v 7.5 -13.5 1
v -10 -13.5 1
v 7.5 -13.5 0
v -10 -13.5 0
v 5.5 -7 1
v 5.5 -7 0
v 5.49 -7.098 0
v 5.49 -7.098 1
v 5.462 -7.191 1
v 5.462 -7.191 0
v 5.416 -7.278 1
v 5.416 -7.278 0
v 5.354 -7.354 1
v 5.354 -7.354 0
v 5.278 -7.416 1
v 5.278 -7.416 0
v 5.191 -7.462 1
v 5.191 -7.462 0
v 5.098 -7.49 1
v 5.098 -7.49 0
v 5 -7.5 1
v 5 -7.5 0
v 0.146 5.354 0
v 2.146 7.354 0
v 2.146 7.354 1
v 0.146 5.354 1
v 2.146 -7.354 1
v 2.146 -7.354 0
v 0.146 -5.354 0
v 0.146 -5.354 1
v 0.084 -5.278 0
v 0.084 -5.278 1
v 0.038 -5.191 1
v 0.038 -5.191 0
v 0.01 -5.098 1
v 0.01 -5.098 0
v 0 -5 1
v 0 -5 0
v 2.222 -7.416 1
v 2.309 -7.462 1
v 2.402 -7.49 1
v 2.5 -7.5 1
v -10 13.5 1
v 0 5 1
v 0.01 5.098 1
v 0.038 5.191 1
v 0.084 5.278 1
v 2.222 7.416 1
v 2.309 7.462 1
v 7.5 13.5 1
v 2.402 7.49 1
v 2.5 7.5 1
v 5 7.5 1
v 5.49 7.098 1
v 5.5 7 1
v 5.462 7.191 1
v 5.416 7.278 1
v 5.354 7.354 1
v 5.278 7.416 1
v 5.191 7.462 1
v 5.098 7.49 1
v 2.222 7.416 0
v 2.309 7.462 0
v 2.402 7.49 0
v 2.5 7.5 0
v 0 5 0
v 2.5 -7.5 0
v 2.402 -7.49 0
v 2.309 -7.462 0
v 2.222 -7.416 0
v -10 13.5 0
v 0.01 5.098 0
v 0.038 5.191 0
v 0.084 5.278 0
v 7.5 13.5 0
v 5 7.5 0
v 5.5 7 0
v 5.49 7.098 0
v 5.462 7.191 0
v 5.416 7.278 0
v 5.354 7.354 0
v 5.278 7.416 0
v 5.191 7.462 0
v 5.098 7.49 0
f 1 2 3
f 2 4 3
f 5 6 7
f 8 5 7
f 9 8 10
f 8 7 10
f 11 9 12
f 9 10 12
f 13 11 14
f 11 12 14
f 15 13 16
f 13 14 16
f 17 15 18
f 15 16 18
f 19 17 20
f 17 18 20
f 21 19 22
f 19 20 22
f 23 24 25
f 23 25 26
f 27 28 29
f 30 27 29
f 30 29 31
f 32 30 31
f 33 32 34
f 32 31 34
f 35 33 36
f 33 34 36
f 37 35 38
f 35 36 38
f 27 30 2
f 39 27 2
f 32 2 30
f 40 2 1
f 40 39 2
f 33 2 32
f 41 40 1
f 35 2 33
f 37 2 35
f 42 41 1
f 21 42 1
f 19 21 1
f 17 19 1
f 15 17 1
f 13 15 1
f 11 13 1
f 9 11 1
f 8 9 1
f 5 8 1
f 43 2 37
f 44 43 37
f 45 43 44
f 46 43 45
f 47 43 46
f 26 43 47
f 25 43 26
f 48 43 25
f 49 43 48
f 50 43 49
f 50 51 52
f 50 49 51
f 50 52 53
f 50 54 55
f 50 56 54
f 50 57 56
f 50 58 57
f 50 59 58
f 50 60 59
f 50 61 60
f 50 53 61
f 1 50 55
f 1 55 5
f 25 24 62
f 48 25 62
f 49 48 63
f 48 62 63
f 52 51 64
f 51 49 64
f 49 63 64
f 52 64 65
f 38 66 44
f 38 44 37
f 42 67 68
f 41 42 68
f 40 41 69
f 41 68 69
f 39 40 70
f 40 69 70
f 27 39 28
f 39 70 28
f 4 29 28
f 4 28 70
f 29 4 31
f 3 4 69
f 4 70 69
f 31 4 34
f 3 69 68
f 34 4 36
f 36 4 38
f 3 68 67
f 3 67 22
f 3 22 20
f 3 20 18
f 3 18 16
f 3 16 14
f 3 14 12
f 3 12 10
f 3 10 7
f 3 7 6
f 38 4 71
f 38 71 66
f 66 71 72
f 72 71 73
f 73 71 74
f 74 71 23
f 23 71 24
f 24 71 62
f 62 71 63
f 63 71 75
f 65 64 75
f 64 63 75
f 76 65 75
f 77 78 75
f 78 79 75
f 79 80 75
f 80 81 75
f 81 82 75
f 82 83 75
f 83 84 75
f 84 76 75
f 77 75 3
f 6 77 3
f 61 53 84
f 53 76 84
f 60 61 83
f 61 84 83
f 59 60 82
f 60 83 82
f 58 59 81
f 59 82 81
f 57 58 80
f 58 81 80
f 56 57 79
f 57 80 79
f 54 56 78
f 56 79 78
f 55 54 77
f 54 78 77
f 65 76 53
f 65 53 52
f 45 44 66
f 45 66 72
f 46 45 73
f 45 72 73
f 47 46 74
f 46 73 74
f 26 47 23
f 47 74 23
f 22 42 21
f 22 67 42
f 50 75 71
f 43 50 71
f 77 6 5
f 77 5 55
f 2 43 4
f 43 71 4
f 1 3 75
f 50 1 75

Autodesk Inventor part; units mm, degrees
ref_plane "YZ Plane" through (0, 0, 0) normal (1, 0, 0) x (0, 1, 0)
ref_plane "XZ Plane" through (0, 0, 0) normal (0, 1, 0) x (-1, 0, 0)
ref_plane "XY Plane" through (0, 0, 0) normal (0, 0, 1) x (1, 0, 0)
sketch "Sketch1" plane through (0, 0, 0) normal (0, 0, 1) x (1, 0, 0)
  line L0 (5, 7.5) -> (2.5, 7.5)
  line L1 (0, 5) -> (0, -5)
  line L2 (2.5, -7.5) -> (5, -7.5)
  line L3 (5.5, -7) -> (5.5, 7)
  line L4 (2.1464, 7.3536) -> (0.1464, 5.3536)
  line L5 (2.1464, -7.3536) -> (0.1464, -5.3536)
  line L6 (5.5, 0) -> (-0.5, 0) construction
  arc A0 (5.5, 7) -> (5, 7.5) centre (5, 7) ccw
  arc A1 (5, -7.5) -> (5.5, -7) centre (5, -7) ccw
  arc A2 (2.1464, -7.3536) -> (2.5, -7.5) centre (2.5, -7) ccw
  arc A3 (0, -5) -> (0.1464, -5.3536) centre (0.5, -5) ccw
  arc A4 (0.1464, 5.3536) -> (0, 5) centre (0.5, 5) ccw
  arc A5 (2.5, 7.5) -> (2.1464, 7.3536) centre (2.5, 7) ccw
  line L7 (5, 7) -> (5, -7)
  line L8 (5, -7) -> (2.5, -7)
  line L9 (2.5, -7) -> (0.5, -5)
  line L10 (0.5, -5) -> (0.5, 5)
  line L11 (0.5, 5) -> (2.5, 7)
  line L12 (2.5, 7) -> (5, 7)
  line L13 (7.5, 13.5) -> (-10, 13.5)
  line L14 (-10, 13.5) -> (-10, -13.5)
  line L15 (-10, -13.5) -> (7.5, -13.5)
  line L16 (7.5, -13.5) -> (7.5, 13.5)
  line L17 (5.5, 0) -> (7.5, 0) construction
  point P0 (0, 0)
  point P1 (-0.5, 0)
  point P2 (5.5, 7.5)
  point P3 (5.5, -7.5)
  point P4 (-0.5, 0)
  point P5 (0, 0)
  dimension "d0" = 0.5
  dimension "d1" = 15
  dimension "d2" = 5.5
  dimension "d3" = 0.5
  dimension "d4" = 135
  dimension "d5" = 3
  dimension "d6" = 0.5
  dimension "d7" = 10
  dimension "d8" = 27
  dimension "d9" = 2
extrude "Extrusion1" add sketch "Sketch1" along normal blind 1 contours L16 L15 L14 L13
properties part number "P002-Cache-HDMI"
